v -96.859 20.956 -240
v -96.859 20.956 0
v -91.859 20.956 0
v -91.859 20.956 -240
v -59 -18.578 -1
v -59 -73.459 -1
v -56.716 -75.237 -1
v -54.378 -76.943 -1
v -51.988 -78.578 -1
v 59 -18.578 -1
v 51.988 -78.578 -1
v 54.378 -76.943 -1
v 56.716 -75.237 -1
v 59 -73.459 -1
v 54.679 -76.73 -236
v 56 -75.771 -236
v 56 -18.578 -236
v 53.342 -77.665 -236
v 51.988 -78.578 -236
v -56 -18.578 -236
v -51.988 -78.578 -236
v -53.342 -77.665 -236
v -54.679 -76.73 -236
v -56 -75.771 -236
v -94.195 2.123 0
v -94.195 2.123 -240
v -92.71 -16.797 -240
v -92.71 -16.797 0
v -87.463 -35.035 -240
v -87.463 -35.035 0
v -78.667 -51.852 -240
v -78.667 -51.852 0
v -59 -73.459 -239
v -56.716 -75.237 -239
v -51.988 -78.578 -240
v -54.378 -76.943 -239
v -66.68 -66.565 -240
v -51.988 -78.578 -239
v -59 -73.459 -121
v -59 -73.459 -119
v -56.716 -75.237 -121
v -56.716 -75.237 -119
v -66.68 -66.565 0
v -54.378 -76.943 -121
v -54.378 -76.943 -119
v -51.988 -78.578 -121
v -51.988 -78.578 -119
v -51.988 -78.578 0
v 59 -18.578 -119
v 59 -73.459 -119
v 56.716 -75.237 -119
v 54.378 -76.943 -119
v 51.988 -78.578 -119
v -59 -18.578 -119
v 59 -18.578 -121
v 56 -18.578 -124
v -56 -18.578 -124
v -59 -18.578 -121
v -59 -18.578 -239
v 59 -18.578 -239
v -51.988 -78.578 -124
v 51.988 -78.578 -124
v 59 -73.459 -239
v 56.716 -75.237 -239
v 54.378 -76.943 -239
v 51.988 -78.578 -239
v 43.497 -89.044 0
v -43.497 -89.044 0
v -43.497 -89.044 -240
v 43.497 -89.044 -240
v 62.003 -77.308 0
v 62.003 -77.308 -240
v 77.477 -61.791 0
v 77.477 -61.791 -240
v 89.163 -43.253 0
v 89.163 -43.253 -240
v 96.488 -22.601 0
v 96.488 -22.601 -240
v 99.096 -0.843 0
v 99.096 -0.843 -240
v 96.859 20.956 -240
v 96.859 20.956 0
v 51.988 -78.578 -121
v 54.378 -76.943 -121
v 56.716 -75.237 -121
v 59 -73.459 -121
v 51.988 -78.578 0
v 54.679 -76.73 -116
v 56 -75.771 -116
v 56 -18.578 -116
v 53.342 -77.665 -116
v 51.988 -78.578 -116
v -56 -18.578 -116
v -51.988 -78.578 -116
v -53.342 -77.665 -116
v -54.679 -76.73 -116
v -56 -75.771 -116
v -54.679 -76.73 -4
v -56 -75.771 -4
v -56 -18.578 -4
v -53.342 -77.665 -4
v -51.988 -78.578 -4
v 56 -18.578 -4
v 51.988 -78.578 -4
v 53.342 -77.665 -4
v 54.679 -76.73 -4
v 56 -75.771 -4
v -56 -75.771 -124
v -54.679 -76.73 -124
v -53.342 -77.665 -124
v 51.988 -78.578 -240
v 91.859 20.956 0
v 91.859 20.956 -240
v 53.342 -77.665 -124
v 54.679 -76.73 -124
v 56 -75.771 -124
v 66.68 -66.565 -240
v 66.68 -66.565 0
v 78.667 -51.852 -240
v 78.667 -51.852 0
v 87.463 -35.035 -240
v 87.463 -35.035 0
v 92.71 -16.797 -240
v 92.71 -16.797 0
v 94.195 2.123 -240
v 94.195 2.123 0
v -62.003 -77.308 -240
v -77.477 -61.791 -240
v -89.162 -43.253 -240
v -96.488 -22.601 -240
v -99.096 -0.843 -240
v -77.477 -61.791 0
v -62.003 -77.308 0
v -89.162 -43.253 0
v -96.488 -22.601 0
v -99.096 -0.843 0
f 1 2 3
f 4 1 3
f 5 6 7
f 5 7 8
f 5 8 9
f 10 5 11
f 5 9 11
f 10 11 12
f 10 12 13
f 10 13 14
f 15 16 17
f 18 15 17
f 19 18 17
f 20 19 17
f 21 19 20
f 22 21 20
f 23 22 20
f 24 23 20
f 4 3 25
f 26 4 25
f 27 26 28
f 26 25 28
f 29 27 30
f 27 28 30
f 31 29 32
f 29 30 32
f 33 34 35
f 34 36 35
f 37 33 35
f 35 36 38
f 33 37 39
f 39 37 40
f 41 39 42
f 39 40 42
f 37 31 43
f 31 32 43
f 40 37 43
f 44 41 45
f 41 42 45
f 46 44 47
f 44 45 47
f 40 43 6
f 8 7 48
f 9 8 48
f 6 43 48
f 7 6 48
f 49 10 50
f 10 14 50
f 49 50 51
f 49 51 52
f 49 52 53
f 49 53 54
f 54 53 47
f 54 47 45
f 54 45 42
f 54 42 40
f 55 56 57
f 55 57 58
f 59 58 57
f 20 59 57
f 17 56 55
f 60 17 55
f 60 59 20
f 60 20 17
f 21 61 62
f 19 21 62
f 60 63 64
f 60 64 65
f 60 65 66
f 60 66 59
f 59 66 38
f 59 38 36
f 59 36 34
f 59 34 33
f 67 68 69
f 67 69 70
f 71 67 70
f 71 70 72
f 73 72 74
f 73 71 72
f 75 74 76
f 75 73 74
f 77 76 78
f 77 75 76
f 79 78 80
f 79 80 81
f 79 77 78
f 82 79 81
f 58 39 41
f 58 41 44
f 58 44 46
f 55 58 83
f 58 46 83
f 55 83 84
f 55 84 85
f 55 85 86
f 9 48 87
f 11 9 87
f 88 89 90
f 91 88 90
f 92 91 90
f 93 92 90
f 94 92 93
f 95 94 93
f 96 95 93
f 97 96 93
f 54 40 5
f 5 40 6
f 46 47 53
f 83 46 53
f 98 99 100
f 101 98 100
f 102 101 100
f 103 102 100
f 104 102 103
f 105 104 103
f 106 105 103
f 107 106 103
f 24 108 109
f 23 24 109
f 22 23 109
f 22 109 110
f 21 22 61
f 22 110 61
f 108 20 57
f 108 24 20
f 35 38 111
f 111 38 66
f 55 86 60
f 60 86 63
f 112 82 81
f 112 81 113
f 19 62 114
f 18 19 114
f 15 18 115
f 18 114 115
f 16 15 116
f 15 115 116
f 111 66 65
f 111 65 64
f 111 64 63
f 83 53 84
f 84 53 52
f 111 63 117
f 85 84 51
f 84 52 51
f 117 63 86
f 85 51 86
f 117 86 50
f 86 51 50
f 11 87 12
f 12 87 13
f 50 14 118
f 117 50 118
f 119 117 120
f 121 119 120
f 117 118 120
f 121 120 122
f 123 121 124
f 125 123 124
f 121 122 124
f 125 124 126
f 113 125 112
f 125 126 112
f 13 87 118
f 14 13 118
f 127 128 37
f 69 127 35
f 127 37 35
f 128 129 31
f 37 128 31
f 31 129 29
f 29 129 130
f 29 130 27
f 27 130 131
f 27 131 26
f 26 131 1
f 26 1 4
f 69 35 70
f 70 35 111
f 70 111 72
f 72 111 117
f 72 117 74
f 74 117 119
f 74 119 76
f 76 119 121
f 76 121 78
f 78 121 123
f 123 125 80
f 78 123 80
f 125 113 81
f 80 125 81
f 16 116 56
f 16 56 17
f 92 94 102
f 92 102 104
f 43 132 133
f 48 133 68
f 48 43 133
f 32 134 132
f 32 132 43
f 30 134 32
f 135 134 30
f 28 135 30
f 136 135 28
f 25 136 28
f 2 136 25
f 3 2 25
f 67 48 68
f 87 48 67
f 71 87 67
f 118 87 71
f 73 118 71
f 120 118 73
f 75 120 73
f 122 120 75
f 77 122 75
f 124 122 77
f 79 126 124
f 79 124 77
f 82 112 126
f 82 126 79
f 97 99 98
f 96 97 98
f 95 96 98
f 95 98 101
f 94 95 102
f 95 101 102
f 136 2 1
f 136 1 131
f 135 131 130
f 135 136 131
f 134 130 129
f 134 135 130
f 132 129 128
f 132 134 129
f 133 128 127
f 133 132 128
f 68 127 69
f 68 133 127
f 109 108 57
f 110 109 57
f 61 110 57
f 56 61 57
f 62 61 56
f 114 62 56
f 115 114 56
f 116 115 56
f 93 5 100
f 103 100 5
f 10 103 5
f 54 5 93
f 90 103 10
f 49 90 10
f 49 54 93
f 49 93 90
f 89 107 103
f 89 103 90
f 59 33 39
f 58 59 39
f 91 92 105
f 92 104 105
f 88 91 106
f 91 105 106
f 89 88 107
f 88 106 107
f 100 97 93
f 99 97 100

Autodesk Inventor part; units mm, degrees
ref_plane "YZ Plane" through (0, 0, 0) normal (1, 0, 0) x (0, 1, 0)
ref_plane "XZ Plane" through (0, 0, 0) normal (0, 1, 0) x (-1, 0, 0)
ref_plane "XY Plane" through (0, 0, 0) normal (0, 0, 1) x (1, 0, 0)
sketch "Sketch1" plane through (0, 0, 0) normal (0, 0, 1) x (1, 0, 0)
  circle A0 centre (0, 0) radius 107.6 construction
  arc A1 (43.4971, -89.6) -> (-43.4971, -89.6) centre (0, 0) ccw construction
  line L0 (43.4971, -89.6) -> (-43.4971, -89.6) construction
  arc A2 (-96.8589, 20.9561) -> (-43.4971, -89.0439) centre (0, 0) ccw
  line L1 (-43.4971, -89.0439) -> (0, -89.0439)
  line L2 (-96.8589, 20.9561) -> (-91.8589, 20.9561)
  arc A3 (-91.8589, 20.9561) -> (-43.4971, -83.5776) centre (0, 0) ccw
  line L3 (-43.4971, -83.5776) -> (0, -83.5776)
  line L4 (0, 99.6) -> (0, -89.6) construction
  arc A4 (43.4971, -89.0439) -> (96.8589, 20.9561) centre (0, 0) ccw
  line L5 (43.4971, -89.0439) -> (0, -89.0439)
  line L6 (96.8589, 20.9561) -> (91.8589, 20.9561)
  arc A5 (43.4971, -83.5776) -> (91.8589, 20.9561) centre (0, 0) ccw
  line L7 (43.4971, -83.5776) -> (0, -83.5776)
  dimension "d0" = 0.5
  dimension "d1" = 110
  dimension "d2" = 5
extrude "Extrusion1" add sketch "Sketch1" against normal blind 240
sketch "Sketch2" plane through (0, 0, 0) normal (0, 0, 1) x (1, 0, 0)
  line L0 (-50, -78.5776) -> (50, -78.5776) construction
  line L1 (50, -78.5776) -> (50, 21.4224) construction
  line L2 (-50, 21.4224) -> (50, 21.4224) construction
  line L3 (-50, -78.5776) -> (-50, 21.4224) construction
  arc A0 (-91.8589, 20.9561) -> (-43.4971, -83.5776) centre (0, 0) ccw projected
  line L4 (-51.9882, -78.5776) -> (51.9882, -78.5776)
  arc A1 (-51.9882, -78.5776) -> (-43.4971, -83.5776) centre (0, 0) ccw
  arc A2 (43.4971, -83.5776) -> (91.8589, 20.9561) centre (0, 0) ccw projected
  arc A3 (43.4971, -83.5776) -> (51.9882, -78.5776) centre (0, 0) ccw
  line L5 (43.4971, -83.5776) -> (-43.4971, -83.5776) projected
  line L6 (-43.4971, -83.5776) -> (43.4971, -83.5776)
extrude "Extrusion2" add sketch "Sketch2" against normal up to surface (240 mm away)
sketch "Sketch3" plane through (-51.9882, -78.5776, 0) normal (0, 1, 0) x (1, 0, 0)
  line L0 (0, 240) -> (103.9765, 240) construction
  line L1 (0, 0) -> (0, 240) construction
  line L2 (103.9765, 0) -> (0, 0) construction
  line L3 (103.9765, 240) -> (103.9765, 0) construction
  line L4 (94.4882, 137.5) -> (9.4882, 137.5) construction
  line L5 (9.4882, 137.5) -> (9.4882, 222.5) construction
  line L6 (9.4882, 222.5) -> (94.4882, 222.5) construction
  line L7 (94.4882, 222.5) -> (94.4882, 137.5) construction
  line L8 (1.9882, 230) -> (1.9882, 130) construction
  line L9 (1.9882, 130) -> (101.9882, 130) construction
  line L10 (101.9882, 130) -> (101.9882, 230) construction
  line L11 (101.9882, 230) -> (1.9882, 230) construction
  line L12 (94.4882, 17.5) -> (9.4882, 17.5) construction
  line L13 (9.4882, 17.5) -> (9.4882, 102.5) construction
  line L14 (9.4882, 102.5) -> (94.4882, 102.5) construction
  line L15 (94.4882, 102.5) -> (94.4882, 17.5) construction
  line L16 (1.9882, 110) -> (1.9882, 10) construction
  line L17 (1.9882, 10) -> (101.9882, 10) construction
  line L18 (101.9882, 10) -> (101.9882, 110) construction
  line L19 (101.9882, 110) -> (1.9882, 110) construction
  line L20 (11.9882, 220) -> (11.9882, 140) construction
  line L21 (11.9882, 140) -> (91.9882, 140) construction
  line L22 (91.9882, 140) -> (91.9882, 220) construction
  line L23 (91.9882, 220) -> (11.9882, 220) construction
  line L24 (11.9882, 100) -> (11.9882, 20) construction
  line L25 (11.9882, 20) -> (91.9882, 20) construction
  line L26 (91.9882, 20) -> (91.9882, 100) construction
  line L27 (91.9882, 100) -> (11.9882, 100) construction
  line L28 (-4.0118, 124) -> (107.9882, 124)
  line L29 (107.9882, 124) -> (107.9882, 236)
  line L30 (107.9882, 236) -> (-4.0118, 236)
  line L31 (-4.0118, 236) -> (-4.0118, 124)
  line L32 (-4.0118, 124) -> (107.9882, 236) construction
  line L33 (107.9882, 124) -> (-4.0118, 236) construction
  line L34 (-7.0118, 121) -> (110.9882, 121)
  line L35 (110.9882, 121) -> (110.9882, 239)
  line L36 (110.9882, 239) -> (-7.0118, 239)
  line L37 (-7.0118, 239) -> (-7.0118, 121)
  line L38 (-7.0118, 121) -> (110.9882, 239) construction
  line L39 (110.9882, 121) -> (-7.0118, 239) construction
  line L40 (-4.0118, 4) -> (107.9882, 4)
  line L41 (107.9882, 4) -> (107.9882, 116)
  line L42 (107.9882, 116) -> (-4.0118, 116)
  line L43 (-4.0118, 116) -> (-4.0118, 4)
  line L44 (-4.0118, 4) -> (107.9882, 116) construction
  line L45 (107.9882, 4) -> (-4.0118, 116) construction
  line L46 (-7.0118, 1) -> (110.9882, 1)
  line L47 (110.9882, 1) -> (110.9882, 119)
  line L48 (110.9882, 119) -> (-7.0118, 119)
  line L49 (-7.0118, 119) -> (-7.0118, 1)
  line L50 (-7.0118, 1) -> (110.9882, 119) construction
  line L51 (110.9882, 1) -> (-7.0118, 119) construction
  point P0 (51.9882, 0)
  point P1 (51.9882, 180)
  point P2 (51.9882, 60)
  dimension "d7" = 6
  dimension "d8" = 6
  dimension "d9" = 6
  dimension "d10" = 6
  dimension "d11" = 3
  dimension "d12" = 6
  dimension "d13" = 6
  dimension "d14" = 6
  dimension "d15" = 6
  dimension "d16" = 3
extrude "Extrusion3" add sketch "Sketch3" along normal blind 60
properties part number "InsertV1_3DPrint"
